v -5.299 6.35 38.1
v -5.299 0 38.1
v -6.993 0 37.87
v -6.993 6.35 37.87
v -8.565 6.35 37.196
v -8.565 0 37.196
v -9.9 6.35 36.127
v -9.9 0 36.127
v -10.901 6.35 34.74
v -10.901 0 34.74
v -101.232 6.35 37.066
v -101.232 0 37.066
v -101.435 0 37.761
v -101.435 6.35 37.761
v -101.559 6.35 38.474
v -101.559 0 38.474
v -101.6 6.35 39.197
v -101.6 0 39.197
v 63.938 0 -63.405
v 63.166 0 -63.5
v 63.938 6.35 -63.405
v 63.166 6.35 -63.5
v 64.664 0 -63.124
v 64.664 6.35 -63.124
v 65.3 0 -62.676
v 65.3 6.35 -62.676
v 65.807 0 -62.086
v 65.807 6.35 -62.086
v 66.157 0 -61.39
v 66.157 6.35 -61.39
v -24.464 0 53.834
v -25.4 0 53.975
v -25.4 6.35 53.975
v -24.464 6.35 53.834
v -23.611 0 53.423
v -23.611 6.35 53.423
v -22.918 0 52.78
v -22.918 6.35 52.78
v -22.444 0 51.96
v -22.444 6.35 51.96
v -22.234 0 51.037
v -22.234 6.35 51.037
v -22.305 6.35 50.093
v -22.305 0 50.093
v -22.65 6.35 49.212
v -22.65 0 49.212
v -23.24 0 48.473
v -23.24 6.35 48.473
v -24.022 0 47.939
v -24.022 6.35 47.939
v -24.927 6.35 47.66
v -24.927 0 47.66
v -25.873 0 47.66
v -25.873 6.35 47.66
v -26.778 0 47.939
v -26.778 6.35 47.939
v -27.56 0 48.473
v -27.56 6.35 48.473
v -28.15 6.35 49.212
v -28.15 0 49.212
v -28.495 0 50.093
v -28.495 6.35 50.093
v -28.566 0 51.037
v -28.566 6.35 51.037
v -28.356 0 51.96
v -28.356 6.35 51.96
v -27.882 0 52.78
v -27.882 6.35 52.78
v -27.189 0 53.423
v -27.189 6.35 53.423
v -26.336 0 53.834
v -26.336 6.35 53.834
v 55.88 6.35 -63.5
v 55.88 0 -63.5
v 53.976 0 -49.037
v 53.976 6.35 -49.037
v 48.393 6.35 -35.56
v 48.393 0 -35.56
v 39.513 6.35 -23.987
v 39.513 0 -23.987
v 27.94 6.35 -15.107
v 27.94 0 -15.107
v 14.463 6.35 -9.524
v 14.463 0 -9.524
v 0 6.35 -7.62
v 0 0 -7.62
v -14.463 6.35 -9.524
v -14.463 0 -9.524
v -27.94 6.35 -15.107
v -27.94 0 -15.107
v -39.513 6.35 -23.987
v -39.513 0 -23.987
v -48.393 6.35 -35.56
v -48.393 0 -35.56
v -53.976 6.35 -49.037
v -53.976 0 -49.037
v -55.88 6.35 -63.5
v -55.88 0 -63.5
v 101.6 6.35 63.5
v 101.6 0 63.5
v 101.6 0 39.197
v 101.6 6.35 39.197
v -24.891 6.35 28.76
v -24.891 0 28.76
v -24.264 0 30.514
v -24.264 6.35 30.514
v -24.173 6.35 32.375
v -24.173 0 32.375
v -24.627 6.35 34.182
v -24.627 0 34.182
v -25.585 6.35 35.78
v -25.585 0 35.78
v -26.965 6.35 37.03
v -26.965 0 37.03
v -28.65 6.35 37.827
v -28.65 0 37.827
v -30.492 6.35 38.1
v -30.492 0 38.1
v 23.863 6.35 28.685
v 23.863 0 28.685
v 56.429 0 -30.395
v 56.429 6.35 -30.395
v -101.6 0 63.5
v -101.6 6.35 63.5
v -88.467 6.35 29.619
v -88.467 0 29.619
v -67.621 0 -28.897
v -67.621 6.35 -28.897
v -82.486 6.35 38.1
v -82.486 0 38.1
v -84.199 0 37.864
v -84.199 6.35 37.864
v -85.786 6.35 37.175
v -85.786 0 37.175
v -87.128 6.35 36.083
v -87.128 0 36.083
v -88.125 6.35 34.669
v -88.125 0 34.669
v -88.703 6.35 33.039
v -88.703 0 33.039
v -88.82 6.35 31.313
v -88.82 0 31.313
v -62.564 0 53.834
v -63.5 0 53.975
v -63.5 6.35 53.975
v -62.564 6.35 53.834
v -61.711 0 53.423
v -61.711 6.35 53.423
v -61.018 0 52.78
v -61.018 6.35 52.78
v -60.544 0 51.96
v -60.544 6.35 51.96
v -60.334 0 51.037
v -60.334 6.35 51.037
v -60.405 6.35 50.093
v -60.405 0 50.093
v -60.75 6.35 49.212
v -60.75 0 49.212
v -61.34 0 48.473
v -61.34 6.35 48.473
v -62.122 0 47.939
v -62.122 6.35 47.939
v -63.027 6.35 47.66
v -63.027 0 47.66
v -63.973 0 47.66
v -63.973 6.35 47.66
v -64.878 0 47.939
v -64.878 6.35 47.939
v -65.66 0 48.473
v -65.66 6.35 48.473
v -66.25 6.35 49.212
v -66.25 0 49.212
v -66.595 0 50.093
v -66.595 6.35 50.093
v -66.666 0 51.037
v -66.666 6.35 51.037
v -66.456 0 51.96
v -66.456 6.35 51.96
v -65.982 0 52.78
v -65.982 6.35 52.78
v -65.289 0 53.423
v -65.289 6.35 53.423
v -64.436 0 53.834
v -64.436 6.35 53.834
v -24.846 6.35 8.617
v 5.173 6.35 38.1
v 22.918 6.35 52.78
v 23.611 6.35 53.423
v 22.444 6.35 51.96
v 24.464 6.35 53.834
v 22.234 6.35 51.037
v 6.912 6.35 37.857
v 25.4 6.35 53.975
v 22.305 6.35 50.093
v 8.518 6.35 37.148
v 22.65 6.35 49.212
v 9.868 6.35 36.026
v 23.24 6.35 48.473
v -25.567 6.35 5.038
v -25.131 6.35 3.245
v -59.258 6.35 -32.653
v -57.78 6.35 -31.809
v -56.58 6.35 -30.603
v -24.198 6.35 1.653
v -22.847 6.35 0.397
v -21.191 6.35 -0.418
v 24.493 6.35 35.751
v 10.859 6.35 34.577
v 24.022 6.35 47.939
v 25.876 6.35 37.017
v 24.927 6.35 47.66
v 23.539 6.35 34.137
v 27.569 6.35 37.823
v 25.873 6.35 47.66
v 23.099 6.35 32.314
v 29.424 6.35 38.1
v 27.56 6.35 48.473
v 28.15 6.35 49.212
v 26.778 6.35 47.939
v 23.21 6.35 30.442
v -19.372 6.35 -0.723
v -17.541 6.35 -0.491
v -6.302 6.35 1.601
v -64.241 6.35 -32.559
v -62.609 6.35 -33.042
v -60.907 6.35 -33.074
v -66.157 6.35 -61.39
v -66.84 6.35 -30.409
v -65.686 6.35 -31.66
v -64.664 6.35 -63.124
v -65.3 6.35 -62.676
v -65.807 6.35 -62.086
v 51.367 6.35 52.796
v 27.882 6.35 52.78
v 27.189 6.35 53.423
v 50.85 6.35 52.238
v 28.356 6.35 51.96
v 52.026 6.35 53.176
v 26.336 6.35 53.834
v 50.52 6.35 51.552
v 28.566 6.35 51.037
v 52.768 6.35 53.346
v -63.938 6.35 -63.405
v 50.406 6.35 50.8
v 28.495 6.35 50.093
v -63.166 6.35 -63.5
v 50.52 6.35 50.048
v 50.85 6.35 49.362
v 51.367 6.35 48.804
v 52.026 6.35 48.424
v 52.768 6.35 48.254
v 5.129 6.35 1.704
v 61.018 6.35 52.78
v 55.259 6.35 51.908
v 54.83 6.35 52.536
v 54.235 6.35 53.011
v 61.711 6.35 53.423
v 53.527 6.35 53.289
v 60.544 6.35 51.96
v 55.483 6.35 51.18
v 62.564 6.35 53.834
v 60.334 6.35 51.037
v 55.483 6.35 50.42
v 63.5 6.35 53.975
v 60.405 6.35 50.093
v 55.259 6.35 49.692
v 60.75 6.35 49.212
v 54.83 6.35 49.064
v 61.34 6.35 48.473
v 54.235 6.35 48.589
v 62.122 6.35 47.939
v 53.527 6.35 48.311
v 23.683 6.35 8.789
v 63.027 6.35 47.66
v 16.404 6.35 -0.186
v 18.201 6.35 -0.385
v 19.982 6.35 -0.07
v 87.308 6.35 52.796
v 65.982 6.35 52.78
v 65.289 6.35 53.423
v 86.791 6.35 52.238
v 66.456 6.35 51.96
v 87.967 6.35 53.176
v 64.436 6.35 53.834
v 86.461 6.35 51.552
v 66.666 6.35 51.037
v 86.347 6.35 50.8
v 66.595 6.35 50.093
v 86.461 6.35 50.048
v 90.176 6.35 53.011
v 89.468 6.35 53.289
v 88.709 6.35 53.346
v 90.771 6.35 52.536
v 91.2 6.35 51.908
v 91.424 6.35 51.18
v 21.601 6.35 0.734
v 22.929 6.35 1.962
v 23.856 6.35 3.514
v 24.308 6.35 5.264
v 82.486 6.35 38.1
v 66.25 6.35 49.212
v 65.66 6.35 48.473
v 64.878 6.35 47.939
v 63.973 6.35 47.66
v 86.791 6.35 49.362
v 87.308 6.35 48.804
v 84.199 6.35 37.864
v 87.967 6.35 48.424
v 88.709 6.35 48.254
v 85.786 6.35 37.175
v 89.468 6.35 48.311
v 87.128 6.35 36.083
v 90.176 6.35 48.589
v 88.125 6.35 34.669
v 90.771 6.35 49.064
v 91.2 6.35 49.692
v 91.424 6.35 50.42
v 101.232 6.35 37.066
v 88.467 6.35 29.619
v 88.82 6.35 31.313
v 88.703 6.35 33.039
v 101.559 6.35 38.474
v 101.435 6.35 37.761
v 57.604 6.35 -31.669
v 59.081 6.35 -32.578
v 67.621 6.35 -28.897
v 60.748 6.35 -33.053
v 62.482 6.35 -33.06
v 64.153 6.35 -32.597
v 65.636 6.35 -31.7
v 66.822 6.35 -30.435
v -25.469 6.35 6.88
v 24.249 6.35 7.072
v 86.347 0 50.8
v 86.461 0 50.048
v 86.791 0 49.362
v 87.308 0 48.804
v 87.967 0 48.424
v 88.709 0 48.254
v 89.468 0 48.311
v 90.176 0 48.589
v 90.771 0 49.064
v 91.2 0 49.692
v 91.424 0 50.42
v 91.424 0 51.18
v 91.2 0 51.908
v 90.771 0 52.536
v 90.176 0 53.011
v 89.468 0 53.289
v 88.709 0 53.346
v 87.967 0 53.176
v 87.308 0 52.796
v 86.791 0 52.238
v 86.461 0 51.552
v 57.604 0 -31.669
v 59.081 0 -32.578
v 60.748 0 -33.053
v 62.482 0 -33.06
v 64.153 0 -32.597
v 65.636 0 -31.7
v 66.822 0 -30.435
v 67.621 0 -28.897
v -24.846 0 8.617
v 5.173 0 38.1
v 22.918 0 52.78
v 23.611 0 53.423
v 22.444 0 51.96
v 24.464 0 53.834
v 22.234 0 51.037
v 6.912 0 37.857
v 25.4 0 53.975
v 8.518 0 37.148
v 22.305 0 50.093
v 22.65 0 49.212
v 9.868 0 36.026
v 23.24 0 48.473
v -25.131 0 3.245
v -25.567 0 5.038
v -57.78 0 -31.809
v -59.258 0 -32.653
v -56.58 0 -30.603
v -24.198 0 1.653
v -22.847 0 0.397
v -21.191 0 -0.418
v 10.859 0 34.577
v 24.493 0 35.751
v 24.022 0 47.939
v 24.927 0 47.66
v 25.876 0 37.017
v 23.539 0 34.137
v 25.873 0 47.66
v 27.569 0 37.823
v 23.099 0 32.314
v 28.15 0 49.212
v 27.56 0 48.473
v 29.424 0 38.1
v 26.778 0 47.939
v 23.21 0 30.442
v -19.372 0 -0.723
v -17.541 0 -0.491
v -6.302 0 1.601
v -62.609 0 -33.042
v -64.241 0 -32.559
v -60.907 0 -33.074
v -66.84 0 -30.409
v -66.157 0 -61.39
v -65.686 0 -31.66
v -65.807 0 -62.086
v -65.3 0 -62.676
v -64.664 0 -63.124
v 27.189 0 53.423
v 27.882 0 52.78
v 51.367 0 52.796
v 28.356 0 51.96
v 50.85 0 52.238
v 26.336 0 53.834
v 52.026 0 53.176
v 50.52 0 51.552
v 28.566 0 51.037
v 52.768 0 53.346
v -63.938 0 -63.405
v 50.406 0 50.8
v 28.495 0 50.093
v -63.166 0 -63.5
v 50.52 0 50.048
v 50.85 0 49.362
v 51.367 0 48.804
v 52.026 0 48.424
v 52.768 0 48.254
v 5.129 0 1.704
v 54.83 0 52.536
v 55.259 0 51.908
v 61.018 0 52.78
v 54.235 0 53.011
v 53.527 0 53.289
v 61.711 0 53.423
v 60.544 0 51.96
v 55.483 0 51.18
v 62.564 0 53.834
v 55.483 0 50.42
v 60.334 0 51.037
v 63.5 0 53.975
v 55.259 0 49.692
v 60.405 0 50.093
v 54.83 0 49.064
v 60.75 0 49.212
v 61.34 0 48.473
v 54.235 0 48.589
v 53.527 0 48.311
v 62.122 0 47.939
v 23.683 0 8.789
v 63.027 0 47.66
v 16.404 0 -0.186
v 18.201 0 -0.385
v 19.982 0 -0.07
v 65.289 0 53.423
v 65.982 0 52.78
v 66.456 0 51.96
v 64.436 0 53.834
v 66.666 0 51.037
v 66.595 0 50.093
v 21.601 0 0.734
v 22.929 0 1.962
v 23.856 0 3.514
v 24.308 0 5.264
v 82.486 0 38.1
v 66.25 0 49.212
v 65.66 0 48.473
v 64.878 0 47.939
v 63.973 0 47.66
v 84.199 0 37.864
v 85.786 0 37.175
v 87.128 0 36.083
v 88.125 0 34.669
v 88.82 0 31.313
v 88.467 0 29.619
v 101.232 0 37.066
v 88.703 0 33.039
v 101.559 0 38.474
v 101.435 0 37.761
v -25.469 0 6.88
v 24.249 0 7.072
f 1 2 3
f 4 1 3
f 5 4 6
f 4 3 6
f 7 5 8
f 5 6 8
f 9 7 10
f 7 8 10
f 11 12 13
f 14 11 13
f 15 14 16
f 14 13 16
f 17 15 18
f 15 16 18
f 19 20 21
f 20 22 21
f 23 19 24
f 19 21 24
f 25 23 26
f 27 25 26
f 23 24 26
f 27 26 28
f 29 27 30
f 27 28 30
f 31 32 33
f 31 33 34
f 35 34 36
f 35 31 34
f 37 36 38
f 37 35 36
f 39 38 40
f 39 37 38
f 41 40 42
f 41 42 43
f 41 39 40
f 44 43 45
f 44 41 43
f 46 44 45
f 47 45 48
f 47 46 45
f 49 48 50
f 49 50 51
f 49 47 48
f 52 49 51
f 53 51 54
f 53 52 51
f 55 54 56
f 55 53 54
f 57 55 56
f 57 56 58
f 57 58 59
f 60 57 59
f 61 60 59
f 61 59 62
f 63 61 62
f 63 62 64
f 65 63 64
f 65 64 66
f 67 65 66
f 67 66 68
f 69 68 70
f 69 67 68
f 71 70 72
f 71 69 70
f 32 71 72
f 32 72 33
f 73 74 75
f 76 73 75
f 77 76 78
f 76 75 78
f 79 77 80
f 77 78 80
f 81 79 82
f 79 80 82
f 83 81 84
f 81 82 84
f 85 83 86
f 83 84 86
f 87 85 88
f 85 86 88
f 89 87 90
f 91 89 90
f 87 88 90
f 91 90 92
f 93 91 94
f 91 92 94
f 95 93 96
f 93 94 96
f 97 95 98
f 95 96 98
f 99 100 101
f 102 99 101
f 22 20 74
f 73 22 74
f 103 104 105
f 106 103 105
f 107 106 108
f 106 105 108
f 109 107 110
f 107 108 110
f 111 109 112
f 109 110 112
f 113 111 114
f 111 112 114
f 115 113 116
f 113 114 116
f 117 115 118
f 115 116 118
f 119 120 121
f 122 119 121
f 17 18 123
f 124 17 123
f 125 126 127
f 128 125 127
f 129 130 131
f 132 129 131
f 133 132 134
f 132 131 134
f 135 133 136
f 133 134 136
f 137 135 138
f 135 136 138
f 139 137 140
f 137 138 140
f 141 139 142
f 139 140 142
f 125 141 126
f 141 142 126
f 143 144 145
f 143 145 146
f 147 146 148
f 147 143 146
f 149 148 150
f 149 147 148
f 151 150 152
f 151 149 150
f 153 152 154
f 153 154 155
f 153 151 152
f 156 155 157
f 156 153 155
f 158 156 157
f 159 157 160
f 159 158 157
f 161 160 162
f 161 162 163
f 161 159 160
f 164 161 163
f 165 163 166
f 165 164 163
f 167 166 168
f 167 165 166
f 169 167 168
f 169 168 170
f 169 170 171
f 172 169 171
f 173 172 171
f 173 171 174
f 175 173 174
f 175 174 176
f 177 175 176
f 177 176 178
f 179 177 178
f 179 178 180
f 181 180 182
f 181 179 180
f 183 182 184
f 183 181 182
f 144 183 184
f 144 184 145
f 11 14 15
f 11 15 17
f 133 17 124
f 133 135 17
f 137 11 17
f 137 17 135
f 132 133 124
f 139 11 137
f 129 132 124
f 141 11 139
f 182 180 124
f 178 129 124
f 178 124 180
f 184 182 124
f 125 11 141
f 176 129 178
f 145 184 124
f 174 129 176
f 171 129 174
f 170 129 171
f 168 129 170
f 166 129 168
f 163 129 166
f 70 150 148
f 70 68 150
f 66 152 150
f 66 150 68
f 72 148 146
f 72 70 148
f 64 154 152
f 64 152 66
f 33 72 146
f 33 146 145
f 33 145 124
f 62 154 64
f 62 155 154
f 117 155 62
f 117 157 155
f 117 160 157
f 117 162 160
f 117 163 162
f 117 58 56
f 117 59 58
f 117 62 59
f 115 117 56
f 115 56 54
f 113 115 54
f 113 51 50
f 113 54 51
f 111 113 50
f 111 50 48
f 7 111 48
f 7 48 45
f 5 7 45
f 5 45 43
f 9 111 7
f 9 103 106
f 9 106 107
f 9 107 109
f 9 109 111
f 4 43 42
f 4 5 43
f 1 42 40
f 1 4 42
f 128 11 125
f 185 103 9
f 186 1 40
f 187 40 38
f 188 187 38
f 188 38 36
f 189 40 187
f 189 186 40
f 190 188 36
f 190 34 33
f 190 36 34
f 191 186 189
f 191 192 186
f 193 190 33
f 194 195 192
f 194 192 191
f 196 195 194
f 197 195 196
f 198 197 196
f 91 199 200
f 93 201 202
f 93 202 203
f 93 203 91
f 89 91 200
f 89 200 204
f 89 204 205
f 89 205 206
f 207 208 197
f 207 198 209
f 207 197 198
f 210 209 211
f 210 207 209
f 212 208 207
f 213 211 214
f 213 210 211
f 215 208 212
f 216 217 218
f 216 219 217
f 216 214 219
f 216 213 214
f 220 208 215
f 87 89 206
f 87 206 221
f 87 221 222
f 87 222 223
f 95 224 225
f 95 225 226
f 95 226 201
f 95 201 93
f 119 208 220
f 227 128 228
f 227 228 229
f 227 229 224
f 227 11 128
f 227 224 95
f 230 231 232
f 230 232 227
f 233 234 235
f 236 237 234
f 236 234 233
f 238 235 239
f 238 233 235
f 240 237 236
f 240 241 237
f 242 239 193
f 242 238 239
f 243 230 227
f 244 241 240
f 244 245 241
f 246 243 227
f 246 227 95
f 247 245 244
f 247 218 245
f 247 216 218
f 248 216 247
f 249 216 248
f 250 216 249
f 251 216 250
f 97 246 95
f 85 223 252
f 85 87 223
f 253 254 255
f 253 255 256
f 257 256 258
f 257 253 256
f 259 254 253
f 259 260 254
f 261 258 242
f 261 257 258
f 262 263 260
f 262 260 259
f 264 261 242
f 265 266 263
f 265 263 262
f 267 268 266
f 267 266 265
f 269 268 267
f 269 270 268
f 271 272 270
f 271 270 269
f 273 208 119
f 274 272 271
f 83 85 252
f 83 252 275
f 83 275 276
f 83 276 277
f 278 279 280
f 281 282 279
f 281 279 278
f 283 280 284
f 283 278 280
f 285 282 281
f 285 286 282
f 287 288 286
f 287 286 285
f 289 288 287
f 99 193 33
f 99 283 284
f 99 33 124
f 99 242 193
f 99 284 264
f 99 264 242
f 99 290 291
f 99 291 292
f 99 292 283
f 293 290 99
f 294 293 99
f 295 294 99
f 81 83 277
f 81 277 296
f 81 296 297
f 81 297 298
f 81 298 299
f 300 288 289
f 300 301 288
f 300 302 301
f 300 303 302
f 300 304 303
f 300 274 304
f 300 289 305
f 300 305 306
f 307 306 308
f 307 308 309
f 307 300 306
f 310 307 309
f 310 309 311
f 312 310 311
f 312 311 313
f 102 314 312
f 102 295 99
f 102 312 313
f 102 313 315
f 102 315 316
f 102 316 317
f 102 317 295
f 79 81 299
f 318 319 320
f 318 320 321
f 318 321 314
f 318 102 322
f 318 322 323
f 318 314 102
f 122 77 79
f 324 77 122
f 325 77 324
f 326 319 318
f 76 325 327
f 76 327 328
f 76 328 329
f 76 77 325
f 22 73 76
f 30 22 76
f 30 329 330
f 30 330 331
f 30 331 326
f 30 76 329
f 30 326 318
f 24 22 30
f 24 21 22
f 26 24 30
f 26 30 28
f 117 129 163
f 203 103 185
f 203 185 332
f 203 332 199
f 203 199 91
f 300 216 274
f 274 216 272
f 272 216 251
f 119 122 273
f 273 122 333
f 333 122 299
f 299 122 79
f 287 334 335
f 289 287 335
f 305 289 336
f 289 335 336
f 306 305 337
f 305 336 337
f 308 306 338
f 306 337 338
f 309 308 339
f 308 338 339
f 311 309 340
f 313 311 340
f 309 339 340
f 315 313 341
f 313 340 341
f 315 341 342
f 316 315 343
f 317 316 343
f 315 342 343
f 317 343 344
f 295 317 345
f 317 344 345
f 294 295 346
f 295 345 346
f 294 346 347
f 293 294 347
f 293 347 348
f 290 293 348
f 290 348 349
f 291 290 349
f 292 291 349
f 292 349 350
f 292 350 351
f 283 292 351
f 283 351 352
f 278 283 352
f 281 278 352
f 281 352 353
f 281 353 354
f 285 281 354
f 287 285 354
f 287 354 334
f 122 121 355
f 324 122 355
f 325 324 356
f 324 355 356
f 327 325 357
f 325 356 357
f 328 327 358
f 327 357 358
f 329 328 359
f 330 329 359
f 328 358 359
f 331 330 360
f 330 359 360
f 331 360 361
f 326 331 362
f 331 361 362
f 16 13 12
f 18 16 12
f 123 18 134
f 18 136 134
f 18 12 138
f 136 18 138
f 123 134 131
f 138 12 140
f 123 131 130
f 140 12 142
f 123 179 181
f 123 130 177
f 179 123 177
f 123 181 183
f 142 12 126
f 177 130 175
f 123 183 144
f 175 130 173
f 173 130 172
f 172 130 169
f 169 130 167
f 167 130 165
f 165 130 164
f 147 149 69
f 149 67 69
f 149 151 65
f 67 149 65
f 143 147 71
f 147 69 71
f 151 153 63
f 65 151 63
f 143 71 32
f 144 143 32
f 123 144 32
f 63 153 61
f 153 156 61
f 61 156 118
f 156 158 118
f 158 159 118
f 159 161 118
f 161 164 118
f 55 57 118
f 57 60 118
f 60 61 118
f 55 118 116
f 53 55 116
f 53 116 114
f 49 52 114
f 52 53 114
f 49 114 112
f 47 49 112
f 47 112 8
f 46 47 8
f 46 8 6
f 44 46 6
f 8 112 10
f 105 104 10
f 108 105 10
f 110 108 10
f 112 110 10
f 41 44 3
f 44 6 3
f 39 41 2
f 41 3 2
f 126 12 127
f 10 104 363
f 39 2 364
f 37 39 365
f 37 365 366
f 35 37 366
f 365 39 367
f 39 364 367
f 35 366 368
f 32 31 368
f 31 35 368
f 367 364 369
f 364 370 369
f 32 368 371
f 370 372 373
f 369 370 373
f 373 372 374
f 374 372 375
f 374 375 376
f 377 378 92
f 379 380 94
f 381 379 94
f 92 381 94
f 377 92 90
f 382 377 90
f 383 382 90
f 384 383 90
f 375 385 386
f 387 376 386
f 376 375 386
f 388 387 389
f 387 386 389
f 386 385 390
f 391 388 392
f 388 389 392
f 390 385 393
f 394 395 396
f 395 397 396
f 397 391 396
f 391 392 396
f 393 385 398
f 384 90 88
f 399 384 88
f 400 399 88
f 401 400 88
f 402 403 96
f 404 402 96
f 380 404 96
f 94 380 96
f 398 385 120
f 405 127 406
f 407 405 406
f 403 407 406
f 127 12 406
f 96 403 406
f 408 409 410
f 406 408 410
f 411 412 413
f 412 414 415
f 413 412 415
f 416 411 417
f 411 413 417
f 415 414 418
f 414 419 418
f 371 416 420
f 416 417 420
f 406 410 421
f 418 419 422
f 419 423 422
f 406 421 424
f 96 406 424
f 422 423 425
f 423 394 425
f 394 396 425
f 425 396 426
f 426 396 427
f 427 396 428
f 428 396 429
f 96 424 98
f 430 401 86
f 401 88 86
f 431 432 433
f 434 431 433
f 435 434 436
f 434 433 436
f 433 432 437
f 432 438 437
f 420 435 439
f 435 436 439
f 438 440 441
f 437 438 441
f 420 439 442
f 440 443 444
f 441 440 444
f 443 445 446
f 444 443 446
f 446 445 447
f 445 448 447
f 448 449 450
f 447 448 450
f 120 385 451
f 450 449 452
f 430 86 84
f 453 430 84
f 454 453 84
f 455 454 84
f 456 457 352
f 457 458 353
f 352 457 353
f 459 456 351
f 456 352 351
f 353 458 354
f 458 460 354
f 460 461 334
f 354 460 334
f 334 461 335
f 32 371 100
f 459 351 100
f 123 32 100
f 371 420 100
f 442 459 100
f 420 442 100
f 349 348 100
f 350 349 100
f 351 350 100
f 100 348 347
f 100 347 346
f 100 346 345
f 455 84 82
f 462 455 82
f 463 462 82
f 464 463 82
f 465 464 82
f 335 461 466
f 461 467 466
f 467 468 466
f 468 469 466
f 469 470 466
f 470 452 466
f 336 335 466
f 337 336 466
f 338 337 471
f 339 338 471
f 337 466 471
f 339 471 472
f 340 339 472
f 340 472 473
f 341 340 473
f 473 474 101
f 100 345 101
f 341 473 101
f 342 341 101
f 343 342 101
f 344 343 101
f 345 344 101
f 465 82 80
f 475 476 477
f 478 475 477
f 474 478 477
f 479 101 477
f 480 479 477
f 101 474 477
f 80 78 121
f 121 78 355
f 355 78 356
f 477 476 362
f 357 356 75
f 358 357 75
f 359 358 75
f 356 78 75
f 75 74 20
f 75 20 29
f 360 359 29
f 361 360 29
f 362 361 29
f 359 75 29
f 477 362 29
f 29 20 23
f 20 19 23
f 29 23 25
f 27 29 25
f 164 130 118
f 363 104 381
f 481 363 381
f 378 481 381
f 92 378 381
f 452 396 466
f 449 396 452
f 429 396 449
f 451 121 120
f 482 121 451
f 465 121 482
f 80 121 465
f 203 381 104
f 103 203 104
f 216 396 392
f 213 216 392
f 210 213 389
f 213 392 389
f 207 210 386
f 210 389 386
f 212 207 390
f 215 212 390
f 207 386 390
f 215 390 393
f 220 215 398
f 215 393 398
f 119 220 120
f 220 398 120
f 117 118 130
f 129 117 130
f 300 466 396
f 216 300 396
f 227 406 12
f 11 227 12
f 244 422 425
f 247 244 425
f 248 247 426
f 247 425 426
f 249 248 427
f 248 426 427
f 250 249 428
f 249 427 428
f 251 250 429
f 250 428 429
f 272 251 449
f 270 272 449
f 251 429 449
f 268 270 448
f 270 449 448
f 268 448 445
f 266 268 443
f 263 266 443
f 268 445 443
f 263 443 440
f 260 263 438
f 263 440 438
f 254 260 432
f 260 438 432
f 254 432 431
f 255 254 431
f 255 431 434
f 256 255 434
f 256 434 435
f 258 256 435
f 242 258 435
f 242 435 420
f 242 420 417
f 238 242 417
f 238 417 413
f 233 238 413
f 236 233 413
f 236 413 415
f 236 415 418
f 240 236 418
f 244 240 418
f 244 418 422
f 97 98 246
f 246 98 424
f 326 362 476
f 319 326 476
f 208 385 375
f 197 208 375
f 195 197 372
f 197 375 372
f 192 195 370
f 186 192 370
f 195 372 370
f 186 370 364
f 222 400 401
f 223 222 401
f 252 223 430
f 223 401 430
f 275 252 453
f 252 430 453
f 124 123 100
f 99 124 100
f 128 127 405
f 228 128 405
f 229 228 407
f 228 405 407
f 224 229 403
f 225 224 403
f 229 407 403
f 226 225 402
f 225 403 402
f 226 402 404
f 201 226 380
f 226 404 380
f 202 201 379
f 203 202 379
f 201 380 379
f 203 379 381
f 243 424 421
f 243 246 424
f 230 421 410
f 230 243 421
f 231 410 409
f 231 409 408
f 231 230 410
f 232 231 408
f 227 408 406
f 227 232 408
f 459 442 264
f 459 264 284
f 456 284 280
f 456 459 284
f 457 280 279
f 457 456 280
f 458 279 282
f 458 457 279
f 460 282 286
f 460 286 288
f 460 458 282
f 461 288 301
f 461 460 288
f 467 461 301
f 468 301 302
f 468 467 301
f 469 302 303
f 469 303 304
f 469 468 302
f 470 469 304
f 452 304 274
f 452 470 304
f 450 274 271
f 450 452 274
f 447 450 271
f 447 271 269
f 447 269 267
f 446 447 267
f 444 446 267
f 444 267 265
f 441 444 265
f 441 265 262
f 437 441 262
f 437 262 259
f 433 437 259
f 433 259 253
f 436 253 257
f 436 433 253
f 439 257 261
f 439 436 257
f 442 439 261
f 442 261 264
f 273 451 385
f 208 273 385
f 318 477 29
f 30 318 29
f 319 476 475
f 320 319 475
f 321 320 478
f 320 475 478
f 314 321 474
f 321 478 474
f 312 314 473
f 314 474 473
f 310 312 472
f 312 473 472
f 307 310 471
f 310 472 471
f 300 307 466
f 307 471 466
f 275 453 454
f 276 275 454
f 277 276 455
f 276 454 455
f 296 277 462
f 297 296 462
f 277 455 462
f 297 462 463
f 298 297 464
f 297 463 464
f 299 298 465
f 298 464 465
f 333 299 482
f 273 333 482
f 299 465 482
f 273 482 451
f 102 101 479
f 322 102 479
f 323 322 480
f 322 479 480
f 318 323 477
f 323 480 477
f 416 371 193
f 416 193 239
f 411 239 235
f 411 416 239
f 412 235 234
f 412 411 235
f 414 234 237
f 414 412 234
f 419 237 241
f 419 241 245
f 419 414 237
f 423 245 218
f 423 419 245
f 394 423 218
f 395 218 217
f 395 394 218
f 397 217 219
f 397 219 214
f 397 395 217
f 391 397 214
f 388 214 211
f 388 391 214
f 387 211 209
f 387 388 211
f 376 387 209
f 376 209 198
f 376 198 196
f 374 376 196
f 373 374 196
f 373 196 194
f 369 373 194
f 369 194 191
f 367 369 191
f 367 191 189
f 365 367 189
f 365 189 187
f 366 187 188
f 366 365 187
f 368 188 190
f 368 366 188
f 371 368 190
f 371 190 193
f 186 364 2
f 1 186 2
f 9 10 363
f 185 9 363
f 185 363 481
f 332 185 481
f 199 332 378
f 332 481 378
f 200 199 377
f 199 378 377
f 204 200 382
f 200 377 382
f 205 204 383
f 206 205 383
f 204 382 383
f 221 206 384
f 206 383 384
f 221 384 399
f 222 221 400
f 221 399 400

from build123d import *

# Parameters (mm, degrees)
SKETCH1_R              = 3.175
BOSS_EXTRUDE1_DEPTH    = 6.35
FILLET1_R              = 3.175
F_10_CLEARANCE_HOLE1_D = 5.1054


with BuildPart() as part:
    # Sketch1 → Boss-Extrude1 (new body)
    with BuildSketch(Plane(origin=(0, 0, 0), x_dir=(1, 0, 0), z_dir=(0, 1, 0))):
        with BuildLine():
            ThreePointArc((55.88, 63.5), (0, 7.62), (-55.88, 63.5))
            Line((-55.88, 63.5), (-65.405, 63.5))
            Line((-65.405, 63.5), (-101.231750934, -37.066318412))
            ThreePointArc((-101.231750934, -37.066318412), (-101.50726052, -38.116025925), (-101.6, -39.197317183))
            Line((-101.6, -39.197317183), (-101.6, -63.5))
            Line((-101.6, -63.5), (101.6, -63.5))
            Line((101.6, -63.5), (101.6, -39.197317183))
            ThreePointArc((101.6, -39.197317183), (101.50726052, -38.116025925), (101.231750934, -37.066318412))
            Line((101.231750934, -37.066318412), (65.405, 63.5))
            Line((65.405, 63.5), (55.88, 63.5))
        make_face()
        with Locations(Location((-63.5, -50.8, 0), (0, 0, 270))):
            Circle(SKETCH1_R, mode=Mode.SUBTRACT)
        with Locations(Location((-25.4, -50.8, 0), (0, 0, 270))):
            Circle(SKETCH1_R, mode=Mode.SUBTRACT)
        with BuildLine():
            Line((-30.492459165, -38.1), (-82.485514384, -38.1))
            ThreePointArc((-82.485514384, -38.1), (-87.67465411, -35.409962965), (-88.467265319, -29.61900123))
            Line((-88.467265319, -29.61900123), (-67.620951247, 28.896968093))
            ThreePointArc((-67.620951247, 28.896968093), (-62.60882158, 33.04150393), (-56.579551543, 30.602954379))
            Line((-56.579551543, 30.602954379), (-24.890648803, -28.759645393))
            ThreePointArc((-24.890648803, -28.759645393), (-25.046761241, -35.016018084), (-30.492459165, -38.1))
        make_face(mode=Mode.SUBTRACT)
        with BuildLine():
            ThreePointArc((-5.299041163, -38.1), (-8.565059247, -37.195697924), (-10.900851525, -34.740354607))
            Line((-10.900851525, -34.740354607), (-24.84623891, -8.616557995))
            ThreePointArc((-24.84623891, -8.616557995), (-24.197984845, -1.653196967), (-17.541381774, 0.491159744))
            ThreePointArc((-17.541381774, 0.491159744), (-0.588821605, -1.902349454), (16.404084946, 0.185546499))
            ThreePointArc((16.404084946, 0.185546499), (22.928583423, -1.961591642), (23.68255589, -8.788802499))
            Line((23.68255589, -8.788802499), (10.859081809, -34.577314678))
            ThreePointArc((10.859081809, -34.577314678), (8.517567892, -37.14796018), (5.173240471, -38.1))
            Line((5.173240471, -38.1), (-5.299041163, -38.1))
        make_face(mode=Mode.SUBTRACT)
        with Locations(Location((25.4, -50.8, 0), (0, 0, 270))):
            Circle(SKETCH1_R, mode=Mode.SUBTRACT)
        with Locations(Location((63.5, -50.8, 0), (0, 0, 270))):
            Circle(SKETCH1_R, mode=Mode.SUBTRACT)
        with BuildLine():
            Line((67.620951247, 28.896968093), (88.467265319, -29.61900123))
            ThreePointArc((88.467265319, -29.61900123), (87.67465411, -35.409962965), (82.485514384, -38.1))
            Line((82.485514384, -38.1), (29.423726477, -38.1))
            ThreePointArc((29.423726477, -38.1), (23.956198754, -34.979340583), (23.862621229, -28.684611212))
            Line((23.862621229, -28.684611212), (56.428690976, 30.395444829))
            ThreePointArc((56.428690976, 30.395444829), (62.481851802, 33.059810636), (67.620951247, 28.896968093))
        make_face(mode=Mode.SUBTRACT)
    extrude(amount=BOSS_EXTRUDE1_DEPTH)

    # Fillet1
    fillet1_edges = [part.edges().sort_by_distance(p)[0] for p in [
        (-65.405, 3.175, -63.5),
        (65.405, 3.175, -63.5),
    ]]
    fillet(fillet1_edges, radius=FILLET1_R)

    # #10 Clearance Hole1 (through all)
    with Locations(Plane(origin=(0, 6.35, 0), x_dir=(1, 0, 0), z_dir=(0, 1, 0))):
        with Locations((52.959, -50.8), (88.9, -50.8)):
            Hole(F_10_CLEARANCE_HOLE1_D / 2)


solid = part.part
